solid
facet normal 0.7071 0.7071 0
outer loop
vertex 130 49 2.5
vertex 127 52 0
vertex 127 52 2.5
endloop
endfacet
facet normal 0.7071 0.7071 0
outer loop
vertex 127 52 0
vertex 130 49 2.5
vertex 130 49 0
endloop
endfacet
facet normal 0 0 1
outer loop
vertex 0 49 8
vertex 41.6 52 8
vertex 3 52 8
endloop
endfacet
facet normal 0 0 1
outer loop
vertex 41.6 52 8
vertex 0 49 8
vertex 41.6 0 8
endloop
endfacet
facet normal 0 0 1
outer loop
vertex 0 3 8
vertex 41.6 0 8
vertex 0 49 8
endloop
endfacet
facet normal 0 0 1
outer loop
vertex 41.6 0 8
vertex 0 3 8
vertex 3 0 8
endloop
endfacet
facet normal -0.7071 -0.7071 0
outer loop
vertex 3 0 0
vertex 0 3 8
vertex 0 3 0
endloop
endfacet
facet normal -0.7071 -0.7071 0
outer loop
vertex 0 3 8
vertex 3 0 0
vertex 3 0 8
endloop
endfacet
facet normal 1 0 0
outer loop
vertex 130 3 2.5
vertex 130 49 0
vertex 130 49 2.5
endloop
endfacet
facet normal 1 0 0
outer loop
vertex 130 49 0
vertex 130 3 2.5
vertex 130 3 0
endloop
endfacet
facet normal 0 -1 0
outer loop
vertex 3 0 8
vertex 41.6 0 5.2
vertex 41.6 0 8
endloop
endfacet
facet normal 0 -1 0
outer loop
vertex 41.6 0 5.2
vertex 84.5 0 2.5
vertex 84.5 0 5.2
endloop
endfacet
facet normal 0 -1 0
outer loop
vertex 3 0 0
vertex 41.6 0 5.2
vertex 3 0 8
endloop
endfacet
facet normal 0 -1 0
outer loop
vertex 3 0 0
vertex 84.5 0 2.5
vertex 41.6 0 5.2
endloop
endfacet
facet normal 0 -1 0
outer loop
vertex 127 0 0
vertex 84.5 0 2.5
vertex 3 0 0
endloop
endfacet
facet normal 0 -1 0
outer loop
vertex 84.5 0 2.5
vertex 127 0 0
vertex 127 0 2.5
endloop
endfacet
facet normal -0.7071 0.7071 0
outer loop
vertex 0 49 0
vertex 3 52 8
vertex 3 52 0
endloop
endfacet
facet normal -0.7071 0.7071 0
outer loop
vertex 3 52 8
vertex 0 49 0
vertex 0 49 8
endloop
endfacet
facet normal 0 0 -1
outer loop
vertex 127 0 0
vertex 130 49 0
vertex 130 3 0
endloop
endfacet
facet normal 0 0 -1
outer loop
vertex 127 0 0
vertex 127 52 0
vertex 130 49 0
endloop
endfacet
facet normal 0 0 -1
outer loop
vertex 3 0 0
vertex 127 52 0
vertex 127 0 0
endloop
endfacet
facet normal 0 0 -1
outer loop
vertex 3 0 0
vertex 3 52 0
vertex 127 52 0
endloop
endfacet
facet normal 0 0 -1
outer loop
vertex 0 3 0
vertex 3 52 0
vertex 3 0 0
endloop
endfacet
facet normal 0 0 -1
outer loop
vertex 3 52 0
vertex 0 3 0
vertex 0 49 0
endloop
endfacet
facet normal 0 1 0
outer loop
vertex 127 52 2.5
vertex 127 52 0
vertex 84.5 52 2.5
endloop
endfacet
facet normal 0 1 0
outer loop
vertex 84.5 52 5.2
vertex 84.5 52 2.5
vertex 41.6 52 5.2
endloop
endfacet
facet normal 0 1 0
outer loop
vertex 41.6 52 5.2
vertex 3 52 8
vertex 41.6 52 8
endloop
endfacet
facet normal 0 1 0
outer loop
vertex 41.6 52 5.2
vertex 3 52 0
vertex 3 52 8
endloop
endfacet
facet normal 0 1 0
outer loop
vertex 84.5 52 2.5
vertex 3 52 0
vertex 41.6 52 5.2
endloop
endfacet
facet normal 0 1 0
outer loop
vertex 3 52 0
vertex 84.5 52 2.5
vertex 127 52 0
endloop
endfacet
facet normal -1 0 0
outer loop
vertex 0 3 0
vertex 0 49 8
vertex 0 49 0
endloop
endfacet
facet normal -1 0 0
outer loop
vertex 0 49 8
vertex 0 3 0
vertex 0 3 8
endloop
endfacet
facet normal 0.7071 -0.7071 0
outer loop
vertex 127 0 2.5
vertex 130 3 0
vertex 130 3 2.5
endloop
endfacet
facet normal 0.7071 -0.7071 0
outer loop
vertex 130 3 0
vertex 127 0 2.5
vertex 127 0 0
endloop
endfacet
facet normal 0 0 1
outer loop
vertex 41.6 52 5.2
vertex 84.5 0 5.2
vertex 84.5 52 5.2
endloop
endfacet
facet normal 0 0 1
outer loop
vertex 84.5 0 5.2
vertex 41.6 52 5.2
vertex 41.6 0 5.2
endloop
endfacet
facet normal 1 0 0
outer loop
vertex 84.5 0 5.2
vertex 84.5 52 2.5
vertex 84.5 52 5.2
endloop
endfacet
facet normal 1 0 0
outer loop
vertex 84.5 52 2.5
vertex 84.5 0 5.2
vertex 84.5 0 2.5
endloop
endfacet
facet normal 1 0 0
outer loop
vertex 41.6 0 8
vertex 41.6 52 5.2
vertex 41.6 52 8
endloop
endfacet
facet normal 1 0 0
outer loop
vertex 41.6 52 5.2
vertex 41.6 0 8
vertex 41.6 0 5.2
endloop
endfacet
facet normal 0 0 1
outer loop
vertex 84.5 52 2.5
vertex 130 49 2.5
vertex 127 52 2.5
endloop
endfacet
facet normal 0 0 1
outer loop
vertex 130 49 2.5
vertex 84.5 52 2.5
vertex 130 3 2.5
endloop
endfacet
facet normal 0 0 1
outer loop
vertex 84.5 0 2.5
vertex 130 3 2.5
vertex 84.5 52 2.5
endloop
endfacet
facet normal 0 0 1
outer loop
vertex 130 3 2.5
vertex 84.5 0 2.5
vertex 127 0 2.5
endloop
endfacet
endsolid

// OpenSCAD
$fn = 32;

// ----------------------------------------------------------------------
// Stepped bar: twostep, 130 x 52 x 8/2.5 mm
// ----------------------------------------------------------------------

// --- parameters (mm) ---
bar_l = 130;              // bar length, X
bar_w = 52;               // bar width, Y
plate_t = 8;              // thickness of the thick zone, Z
thin_t = 2.5;             // thickness of the thin zone
corner_c = 3;             // corner chamfer of the bar
step_cut = 5.5;           // material removed from the thin zone
stair1_x = 41.6;          // position of the first stair
stair2_x = 84.5;          // position of the second stair
mid_t = 5.2;              // thickness of the middle zone
depth_1 = 2.8;            // depth of cut 1 from the top face
depth_2 = 5.5;            // depth of cut 2 from the top face

profile = [[3, 0], [127, 0], [130, 3], [130, 49], [127, 52], [3, 52], [0, 49], [0, 3]];  // primary outline, 8 points, counter clockwise
void_1 = [[41.6, -1], [84.5, -1], [84.5, 53], [41.6, 53]];  // first stair, 4 points
void_2 = [[84.5, -1], [131, -1], [131, 53], [84.5, 53]];  // second stair, 4 points

// --- the one profile operation ---
difference() {
  linear_extrude(height = plate_t) polygon(points = profile);
  translate([0, 0, plate_t - depth_1])
    linear_extrude(height = depth_1 + 1) polygon(points = void_1);
  translate([0, 0, plate_t - depth_2])
    linear_extrude(height = depth_2 + 1) polygon(points = void_2);
}
